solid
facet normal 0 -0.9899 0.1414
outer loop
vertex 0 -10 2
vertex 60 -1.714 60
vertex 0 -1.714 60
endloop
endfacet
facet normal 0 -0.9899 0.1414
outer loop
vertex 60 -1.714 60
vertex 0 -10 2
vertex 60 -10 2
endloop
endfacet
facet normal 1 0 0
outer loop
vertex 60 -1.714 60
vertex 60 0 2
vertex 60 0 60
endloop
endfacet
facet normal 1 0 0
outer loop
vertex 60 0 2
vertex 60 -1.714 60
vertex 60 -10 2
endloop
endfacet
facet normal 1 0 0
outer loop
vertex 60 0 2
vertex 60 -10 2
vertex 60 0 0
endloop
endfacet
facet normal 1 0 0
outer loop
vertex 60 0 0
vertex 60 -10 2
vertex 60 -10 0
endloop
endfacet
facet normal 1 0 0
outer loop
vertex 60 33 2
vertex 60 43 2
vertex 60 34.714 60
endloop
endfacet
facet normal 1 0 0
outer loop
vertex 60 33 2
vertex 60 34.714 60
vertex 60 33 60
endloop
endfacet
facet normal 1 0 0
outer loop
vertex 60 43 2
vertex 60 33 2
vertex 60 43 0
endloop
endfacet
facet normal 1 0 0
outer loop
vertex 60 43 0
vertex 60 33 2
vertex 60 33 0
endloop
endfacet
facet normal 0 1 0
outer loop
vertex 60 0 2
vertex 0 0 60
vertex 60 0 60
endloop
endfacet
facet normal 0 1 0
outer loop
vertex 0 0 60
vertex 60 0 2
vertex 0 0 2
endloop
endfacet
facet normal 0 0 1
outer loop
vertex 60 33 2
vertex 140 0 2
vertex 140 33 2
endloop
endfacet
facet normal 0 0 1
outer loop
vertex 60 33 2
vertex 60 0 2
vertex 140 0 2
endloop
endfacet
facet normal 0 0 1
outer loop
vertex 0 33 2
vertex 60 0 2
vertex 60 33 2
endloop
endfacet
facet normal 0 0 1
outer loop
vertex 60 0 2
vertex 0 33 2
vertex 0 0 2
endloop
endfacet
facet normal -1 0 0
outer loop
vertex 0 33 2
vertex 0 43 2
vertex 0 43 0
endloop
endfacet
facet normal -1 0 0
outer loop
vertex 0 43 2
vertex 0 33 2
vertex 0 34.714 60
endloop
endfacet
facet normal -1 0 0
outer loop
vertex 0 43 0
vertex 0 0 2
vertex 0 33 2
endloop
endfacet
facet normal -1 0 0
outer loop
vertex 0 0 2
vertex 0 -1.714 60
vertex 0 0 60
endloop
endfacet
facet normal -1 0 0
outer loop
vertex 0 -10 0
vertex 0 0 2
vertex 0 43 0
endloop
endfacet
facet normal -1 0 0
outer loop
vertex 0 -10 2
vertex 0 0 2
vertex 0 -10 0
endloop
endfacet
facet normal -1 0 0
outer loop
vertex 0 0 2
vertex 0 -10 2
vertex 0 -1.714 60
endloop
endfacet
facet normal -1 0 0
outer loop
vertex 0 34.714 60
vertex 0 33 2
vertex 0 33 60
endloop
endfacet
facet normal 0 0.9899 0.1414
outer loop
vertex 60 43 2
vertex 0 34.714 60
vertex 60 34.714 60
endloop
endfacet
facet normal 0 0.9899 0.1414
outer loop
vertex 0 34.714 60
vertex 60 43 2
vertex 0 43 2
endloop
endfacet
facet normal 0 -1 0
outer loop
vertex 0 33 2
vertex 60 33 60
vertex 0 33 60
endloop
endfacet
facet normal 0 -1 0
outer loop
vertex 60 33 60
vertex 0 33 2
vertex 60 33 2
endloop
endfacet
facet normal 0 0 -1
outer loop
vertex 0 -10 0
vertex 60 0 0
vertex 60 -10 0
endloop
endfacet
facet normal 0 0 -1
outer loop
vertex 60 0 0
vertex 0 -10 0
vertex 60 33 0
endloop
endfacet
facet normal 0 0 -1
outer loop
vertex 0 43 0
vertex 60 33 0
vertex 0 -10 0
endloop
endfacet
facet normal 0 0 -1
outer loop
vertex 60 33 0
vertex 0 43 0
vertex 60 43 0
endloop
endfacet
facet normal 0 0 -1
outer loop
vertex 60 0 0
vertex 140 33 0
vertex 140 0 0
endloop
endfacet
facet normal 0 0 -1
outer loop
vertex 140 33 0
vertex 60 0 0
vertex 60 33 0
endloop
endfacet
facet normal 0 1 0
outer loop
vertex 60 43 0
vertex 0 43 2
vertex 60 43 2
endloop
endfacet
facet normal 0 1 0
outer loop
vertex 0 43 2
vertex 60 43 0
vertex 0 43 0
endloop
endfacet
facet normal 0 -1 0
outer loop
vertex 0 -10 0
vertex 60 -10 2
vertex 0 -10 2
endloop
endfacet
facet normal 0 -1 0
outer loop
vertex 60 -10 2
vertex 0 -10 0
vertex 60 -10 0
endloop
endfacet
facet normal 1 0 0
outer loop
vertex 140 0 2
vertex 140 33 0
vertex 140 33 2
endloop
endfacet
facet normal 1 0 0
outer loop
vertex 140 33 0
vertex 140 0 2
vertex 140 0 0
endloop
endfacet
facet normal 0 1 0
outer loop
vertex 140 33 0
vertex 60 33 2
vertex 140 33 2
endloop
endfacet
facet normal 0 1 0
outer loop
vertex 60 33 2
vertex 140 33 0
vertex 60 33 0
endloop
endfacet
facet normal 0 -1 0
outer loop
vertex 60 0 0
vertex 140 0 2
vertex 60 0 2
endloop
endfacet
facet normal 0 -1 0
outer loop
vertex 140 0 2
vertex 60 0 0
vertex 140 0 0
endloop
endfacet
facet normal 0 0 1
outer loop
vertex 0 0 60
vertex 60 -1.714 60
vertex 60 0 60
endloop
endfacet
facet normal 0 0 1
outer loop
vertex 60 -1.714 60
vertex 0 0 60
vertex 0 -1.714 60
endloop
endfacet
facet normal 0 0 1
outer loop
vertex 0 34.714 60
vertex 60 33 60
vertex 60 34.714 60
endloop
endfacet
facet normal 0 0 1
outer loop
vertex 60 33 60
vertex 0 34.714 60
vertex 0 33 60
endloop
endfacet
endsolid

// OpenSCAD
$fa = 1;
$fs = 0.5;
$fn = 50;

space = 33;

module prism(l, w, h) {
    polyhedron(// pt      0        1        2        3        4        5
               points=[[0,0,0], [0,w,h], [l,w,h], [l,0,0], [0,w,0], [l,w,0]],
               // top sloping face (A)
               faces=[[0,1,2,3],
               // vertical rectangular face (B)
               [2,1,4,5],
               // bottom face (C)
               [0,3,5,4],
               // rear triangular face (D)
               [0,4,1],
               // front triangular face (E)
               [3,2,5]]
               );}

translate([0,-10,0])
difference() {
  union() {           
    translate([0,0,2]) prism(60, 10, 70);
    translate([60,10+10+space,2]) rotate([0,0,180]) prism(60, 10, 70);
    cube([60,53,2]);
    translate([0,10,0]) cube([60+80,space,2]);
  }
  translate([-5,0,60]) cube([70,53,20]);
}
